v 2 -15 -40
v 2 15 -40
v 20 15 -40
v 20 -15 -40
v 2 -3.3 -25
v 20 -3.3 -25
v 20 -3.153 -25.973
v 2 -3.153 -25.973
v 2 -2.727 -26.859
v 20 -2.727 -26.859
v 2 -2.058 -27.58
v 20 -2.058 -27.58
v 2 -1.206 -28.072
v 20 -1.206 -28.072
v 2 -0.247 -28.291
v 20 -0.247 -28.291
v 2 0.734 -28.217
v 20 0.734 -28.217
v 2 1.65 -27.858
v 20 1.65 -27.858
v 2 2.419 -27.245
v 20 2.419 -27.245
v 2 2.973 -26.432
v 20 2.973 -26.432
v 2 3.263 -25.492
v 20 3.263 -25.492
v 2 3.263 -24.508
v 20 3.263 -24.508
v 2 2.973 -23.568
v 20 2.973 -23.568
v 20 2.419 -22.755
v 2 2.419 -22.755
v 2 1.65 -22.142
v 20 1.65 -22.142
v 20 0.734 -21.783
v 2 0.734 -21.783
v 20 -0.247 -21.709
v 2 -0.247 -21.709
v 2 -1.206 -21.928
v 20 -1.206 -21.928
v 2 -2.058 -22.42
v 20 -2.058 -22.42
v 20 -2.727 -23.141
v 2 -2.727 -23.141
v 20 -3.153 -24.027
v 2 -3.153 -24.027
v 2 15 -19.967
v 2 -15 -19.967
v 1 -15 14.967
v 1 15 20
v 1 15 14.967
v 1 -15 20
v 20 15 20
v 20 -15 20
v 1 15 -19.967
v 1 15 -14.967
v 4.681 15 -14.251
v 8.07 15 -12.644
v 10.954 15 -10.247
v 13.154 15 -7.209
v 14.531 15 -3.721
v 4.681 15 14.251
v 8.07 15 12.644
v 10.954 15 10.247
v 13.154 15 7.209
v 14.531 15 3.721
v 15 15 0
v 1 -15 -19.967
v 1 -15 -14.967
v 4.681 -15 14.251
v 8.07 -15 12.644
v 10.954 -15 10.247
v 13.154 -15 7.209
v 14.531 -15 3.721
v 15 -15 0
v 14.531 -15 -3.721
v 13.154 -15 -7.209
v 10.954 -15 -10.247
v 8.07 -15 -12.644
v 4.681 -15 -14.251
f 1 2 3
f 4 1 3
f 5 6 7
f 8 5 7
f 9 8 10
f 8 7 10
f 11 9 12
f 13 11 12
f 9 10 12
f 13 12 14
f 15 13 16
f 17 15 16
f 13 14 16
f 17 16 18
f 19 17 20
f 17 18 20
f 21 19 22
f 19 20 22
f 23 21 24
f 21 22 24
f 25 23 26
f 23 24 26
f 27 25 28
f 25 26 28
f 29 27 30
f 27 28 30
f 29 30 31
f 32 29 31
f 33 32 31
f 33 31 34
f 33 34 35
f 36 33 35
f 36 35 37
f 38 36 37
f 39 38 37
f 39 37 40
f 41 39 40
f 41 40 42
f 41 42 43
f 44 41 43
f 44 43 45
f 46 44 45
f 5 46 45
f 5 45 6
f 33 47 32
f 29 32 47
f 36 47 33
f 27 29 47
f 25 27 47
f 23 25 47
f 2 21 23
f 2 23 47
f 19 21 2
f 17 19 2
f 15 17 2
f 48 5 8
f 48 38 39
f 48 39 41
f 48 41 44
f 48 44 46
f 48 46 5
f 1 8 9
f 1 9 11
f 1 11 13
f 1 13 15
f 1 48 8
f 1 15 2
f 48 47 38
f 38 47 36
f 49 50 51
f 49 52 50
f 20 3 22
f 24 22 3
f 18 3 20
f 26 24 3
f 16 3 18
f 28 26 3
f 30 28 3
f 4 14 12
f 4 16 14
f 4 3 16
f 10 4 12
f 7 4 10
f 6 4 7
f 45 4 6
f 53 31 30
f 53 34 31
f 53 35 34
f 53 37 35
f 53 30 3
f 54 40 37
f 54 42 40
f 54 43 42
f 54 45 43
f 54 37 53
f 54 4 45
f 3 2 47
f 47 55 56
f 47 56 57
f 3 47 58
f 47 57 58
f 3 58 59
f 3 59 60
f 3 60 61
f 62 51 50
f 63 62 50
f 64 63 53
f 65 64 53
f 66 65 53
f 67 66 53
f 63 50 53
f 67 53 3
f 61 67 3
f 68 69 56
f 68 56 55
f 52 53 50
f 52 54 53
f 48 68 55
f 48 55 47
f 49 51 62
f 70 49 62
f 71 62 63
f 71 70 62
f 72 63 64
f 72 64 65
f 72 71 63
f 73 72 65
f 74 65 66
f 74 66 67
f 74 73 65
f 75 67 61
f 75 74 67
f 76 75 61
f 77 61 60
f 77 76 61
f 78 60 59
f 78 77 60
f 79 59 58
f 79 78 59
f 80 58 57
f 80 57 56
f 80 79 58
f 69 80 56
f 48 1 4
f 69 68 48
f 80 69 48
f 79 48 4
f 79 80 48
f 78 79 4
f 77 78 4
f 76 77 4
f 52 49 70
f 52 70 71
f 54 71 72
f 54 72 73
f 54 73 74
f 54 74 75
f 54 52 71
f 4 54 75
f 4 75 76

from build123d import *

# Parameters (mm, degrees)
F1_DEPTH = 15
F3_D     = 6.6


with BuildPart() as f1:
    # F0 (on Front) → F1 (new body, symmetric)
    with BuildSketch(Plane.XZ):
        with BuildLine():
            ThreePointArc((1, 14.9666295471), (10.9544511501, 10.246950766), (15, 0))
            ThreePointArc((15, 0), (10.9544511501, -10.246950766), (1, -14.9666295471))
            Line((1, -14.9666295471), (1, -19.9666295471))
            Line((1, -19.9666295471), (2, -19.9666295471))
            Line((2, -19.9666295471), (2, -40))
            Line((2, -40), (20, -40))
            Line((20, -40), (20, 20))
            Line((20, 20), (1, 20))
            Line((1, 20), (1, 14.9666295471))
        make_face()
    extrude(amount=F1_DEPTH, both=True)

    # F3 (through all)
    with Locations(Plane(origin=(0, 0, 0), x_dir=(0, 1, 0), z_dir=(-1, 0, 0))):
        with Locations((0, 25)):
            Hole(F3_D / 2)


solid = f1.part
